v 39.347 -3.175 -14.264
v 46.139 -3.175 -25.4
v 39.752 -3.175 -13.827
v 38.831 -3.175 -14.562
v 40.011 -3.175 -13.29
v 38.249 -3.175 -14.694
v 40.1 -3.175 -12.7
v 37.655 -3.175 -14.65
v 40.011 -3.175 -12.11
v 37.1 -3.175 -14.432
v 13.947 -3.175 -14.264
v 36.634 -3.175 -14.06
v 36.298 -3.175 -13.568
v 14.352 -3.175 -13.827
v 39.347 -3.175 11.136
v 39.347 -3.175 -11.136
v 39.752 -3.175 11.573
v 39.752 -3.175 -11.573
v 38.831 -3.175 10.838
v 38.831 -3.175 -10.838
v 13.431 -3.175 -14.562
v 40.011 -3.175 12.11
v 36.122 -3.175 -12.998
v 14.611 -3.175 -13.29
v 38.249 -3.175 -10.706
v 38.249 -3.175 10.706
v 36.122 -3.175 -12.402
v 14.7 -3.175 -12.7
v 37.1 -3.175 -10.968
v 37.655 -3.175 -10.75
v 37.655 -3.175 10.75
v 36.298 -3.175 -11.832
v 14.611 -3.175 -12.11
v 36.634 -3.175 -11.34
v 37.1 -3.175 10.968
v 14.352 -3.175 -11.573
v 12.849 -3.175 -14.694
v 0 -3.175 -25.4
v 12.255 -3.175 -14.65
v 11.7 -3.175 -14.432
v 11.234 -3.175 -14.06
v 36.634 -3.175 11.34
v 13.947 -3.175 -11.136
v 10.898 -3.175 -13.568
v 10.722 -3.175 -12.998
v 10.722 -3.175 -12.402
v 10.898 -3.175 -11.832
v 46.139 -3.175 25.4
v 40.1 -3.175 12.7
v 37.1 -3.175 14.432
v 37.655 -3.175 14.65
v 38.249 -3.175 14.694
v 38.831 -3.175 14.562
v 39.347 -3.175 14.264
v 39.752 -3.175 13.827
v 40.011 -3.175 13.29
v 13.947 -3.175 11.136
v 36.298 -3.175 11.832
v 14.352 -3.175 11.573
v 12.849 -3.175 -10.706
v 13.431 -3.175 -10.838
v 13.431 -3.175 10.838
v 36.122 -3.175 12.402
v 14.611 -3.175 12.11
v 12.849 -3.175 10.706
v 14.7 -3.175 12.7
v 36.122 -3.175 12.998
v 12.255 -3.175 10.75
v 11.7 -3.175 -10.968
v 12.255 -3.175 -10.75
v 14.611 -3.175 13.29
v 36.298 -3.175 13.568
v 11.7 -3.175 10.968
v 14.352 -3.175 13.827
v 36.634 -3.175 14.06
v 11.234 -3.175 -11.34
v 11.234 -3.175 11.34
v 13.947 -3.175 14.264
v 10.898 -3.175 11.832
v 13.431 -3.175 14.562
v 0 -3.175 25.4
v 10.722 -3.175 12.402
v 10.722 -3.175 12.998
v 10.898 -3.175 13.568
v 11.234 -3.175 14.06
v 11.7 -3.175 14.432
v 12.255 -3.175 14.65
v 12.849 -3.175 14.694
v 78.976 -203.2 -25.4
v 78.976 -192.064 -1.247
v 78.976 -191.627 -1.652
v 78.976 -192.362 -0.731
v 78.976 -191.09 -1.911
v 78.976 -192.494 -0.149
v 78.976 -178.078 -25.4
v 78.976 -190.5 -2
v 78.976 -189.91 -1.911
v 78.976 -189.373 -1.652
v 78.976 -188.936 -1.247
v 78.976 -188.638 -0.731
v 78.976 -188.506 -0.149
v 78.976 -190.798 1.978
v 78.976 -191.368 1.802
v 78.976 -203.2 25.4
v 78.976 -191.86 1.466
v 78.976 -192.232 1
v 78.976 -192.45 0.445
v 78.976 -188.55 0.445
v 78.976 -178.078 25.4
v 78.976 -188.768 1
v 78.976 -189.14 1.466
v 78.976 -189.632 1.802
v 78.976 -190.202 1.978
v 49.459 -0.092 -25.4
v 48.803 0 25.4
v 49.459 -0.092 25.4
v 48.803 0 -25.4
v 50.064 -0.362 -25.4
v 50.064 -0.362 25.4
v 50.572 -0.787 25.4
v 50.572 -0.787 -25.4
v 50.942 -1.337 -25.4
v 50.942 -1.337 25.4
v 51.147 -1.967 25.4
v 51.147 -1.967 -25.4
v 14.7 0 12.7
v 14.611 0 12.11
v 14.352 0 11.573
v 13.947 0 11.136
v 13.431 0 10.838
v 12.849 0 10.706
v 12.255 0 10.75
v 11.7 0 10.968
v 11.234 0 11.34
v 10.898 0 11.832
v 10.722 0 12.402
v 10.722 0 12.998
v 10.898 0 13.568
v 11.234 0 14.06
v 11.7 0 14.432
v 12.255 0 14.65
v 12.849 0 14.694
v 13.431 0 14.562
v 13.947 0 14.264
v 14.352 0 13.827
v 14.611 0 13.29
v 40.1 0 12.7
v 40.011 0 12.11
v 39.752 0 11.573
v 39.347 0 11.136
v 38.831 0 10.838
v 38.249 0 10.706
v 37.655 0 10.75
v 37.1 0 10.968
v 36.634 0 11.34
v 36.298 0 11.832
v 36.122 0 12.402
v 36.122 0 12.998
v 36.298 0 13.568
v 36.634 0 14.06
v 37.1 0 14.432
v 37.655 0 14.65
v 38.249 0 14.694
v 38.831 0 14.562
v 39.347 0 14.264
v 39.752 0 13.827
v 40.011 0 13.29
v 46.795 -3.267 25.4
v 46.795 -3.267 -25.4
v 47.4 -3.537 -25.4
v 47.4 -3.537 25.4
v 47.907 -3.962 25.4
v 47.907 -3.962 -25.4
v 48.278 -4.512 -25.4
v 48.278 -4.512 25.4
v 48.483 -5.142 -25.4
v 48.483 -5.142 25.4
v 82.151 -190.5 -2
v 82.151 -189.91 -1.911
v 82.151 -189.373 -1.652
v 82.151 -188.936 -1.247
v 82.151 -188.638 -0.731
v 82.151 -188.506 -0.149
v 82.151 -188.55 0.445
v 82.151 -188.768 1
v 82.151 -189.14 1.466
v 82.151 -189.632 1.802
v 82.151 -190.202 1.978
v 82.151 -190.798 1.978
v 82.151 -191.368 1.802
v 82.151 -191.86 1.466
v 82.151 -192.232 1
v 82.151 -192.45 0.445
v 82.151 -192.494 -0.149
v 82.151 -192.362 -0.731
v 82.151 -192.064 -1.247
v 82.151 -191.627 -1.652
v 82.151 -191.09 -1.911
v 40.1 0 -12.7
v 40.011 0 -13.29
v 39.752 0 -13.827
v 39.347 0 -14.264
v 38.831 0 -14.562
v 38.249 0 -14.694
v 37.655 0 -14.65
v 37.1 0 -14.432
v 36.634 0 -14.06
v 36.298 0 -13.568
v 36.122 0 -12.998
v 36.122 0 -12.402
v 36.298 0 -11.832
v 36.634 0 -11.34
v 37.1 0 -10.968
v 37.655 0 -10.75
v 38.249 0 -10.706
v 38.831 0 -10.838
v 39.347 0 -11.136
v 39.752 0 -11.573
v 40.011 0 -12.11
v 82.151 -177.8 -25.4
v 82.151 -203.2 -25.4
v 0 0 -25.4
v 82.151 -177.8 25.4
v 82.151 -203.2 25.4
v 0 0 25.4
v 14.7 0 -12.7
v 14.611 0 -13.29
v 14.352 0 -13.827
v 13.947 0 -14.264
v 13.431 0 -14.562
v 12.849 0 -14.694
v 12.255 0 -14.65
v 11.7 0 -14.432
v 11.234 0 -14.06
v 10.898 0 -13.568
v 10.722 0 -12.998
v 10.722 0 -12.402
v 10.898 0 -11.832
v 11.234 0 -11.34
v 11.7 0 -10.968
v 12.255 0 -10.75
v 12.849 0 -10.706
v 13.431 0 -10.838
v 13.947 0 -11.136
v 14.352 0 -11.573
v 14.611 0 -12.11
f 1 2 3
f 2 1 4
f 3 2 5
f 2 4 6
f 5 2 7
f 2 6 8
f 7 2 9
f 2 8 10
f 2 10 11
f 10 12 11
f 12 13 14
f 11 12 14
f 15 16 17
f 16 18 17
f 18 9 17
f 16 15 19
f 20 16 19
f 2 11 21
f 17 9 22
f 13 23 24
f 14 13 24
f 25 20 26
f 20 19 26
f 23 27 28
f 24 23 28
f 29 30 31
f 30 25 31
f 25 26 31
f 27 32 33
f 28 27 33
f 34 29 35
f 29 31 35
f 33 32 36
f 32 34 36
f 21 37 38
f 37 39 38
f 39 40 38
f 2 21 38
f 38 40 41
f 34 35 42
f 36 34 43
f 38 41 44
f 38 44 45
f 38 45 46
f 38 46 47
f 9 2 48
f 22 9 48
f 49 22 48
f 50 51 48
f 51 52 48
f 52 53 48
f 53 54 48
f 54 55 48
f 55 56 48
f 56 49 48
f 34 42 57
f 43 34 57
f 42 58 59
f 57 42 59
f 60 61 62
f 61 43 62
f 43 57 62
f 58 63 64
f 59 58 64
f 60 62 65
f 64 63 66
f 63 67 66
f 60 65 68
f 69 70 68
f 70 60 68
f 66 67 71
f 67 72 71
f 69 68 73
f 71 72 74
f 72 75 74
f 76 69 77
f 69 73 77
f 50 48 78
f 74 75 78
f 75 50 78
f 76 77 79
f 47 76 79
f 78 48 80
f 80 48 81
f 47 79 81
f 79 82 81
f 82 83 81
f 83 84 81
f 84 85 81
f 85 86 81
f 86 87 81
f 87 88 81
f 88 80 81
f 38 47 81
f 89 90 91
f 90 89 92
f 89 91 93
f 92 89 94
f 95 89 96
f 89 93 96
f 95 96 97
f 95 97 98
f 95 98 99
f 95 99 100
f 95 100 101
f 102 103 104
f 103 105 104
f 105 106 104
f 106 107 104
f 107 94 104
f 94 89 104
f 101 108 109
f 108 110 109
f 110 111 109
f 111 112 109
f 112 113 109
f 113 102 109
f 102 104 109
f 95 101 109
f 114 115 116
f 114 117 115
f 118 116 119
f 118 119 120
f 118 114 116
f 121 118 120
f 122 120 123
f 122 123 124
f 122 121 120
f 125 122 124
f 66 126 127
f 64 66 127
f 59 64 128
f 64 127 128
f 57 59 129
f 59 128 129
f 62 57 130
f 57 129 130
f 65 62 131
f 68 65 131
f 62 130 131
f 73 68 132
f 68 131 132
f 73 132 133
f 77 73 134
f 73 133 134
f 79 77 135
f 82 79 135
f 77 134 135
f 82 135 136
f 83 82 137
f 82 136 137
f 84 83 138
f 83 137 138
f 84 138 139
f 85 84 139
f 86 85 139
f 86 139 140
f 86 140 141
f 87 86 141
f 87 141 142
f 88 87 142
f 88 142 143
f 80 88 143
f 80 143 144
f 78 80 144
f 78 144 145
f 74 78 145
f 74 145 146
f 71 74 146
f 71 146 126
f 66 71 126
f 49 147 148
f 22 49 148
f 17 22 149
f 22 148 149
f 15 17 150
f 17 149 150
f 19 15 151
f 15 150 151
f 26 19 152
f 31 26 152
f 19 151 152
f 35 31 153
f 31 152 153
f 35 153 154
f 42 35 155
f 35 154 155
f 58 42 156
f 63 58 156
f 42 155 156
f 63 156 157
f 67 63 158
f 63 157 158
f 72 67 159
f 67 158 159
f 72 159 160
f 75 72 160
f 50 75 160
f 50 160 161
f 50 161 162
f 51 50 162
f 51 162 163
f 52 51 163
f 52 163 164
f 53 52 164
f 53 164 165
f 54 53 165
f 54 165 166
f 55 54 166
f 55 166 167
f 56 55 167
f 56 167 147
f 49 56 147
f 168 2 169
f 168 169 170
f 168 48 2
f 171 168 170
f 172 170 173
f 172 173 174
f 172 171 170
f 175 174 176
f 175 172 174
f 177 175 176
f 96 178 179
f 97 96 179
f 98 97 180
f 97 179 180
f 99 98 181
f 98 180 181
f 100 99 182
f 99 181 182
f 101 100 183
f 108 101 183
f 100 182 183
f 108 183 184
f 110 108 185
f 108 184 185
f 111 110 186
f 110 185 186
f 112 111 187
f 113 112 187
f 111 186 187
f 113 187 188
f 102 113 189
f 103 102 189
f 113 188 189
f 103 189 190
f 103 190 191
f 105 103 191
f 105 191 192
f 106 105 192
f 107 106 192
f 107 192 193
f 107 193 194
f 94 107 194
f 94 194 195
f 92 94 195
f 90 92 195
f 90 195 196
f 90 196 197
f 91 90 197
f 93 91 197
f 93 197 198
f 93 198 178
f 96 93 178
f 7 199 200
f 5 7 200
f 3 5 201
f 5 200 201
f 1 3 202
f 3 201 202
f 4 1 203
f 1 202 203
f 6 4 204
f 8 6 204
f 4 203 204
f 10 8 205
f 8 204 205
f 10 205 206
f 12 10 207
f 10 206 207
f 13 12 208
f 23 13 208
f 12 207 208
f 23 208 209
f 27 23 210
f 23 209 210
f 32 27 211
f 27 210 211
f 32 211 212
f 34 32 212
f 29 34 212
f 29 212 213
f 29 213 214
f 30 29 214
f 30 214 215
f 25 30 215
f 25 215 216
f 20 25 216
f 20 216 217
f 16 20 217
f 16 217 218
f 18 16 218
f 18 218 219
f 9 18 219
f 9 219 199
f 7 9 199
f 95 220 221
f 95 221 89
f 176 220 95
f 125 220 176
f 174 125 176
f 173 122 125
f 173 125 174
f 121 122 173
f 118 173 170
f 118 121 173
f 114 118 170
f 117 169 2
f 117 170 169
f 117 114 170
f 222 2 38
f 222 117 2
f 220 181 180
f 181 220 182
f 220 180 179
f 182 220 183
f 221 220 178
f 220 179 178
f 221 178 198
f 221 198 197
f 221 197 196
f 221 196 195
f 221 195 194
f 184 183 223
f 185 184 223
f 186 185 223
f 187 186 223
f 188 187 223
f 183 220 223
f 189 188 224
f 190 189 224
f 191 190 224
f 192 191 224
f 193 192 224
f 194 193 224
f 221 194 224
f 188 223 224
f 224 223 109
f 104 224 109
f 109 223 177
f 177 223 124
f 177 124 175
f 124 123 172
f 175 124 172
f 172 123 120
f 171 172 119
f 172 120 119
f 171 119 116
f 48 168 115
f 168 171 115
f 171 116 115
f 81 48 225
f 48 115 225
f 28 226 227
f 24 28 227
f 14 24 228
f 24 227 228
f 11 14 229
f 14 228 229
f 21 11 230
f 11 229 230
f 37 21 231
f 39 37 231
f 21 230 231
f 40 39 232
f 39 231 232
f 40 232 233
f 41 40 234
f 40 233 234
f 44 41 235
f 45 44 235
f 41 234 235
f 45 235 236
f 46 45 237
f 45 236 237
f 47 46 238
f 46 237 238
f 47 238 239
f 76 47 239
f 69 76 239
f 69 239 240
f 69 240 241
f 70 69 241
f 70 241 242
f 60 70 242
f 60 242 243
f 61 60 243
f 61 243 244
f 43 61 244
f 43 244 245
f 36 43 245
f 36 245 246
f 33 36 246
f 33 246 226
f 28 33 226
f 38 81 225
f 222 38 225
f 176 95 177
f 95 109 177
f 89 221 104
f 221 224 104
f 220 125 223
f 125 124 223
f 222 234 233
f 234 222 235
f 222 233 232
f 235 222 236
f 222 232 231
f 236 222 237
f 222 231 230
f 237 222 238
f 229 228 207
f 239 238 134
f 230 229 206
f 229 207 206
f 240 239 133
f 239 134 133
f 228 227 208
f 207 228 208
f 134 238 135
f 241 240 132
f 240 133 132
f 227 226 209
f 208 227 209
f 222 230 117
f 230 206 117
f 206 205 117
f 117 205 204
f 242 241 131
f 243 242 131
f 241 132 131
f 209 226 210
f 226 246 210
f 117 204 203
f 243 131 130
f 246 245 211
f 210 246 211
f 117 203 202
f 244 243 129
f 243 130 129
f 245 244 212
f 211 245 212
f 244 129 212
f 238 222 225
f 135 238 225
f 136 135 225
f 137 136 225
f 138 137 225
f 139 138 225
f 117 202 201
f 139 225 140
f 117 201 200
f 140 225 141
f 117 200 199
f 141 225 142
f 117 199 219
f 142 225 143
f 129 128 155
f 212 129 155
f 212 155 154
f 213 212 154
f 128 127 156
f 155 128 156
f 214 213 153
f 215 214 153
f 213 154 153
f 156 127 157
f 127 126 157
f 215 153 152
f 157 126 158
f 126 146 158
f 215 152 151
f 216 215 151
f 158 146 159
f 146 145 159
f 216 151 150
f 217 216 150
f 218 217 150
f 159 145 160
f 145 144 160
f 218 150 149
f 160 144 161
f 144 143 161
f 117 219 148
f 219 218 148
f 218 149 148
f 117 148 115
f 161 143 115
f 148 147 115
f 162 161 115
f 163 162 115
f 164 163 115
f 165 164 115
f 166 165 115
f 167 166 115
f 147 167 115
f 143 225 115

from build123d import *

# Parameters (mm, degrees)
BOSS_EXTRUDE1_DEPTH = 25.4
SKETCH3_R           = 2
CUT_EXTRUDE1_DEPTH  = 50.8
SKETCH4_R           = 2
CUT_EXTRUDE2_DEPTH  = 83.15093717
FILLET1_R           = 2.38


with BuildPart() as part:
    # Sketch1 → Boss-Extrude1 (new body, symmetric)
    with BuildSketch(Plane.XY):
        Polygon((0, 0), (50.8, 0), (82.15093717, -177.8), (82.15093717, -203.2), (78.97593717, -203.2), (78.97593717, -178.077776507), (48.135858671, -3.175), (0, -3.175), align=None)
    extrude(amount=BOSS_EXTRUDE1_DEPTH, both=True)

    # Sketch3 → Cut-Extrude1 (cut)
    with BuildSketch(Plane(origin=(0, 0, 0), x_dir=(1, 0, 0), z_dir=(0, 1, 0))):
        with Locations((12.7, -12.7)):
            Circle(SKETCH3_R)
        with Locations((12.7, 12.7)):
            Circle(SKETCH3_R)
        with Locations((38.1, 12.7)):
            Circle(SKETCH3_R)
        with Locations((38.1, -12.7)):
            Circle(SKETCH3_R)
    extrude(amount=-CUT_EXTRUDE1_DEPTH, mode=Mode.SUBTRACT)

    # Sketch4 → Cut-Extrude2 (cut, through all)
    with BuildSketch(Plane(origin=(82.15093717, 0, 0), x_dir=(0, 0, -1), z_dir=(1, 0, 0))):
        with Locations((0, -190.5)):
            Circle(SKETCH4_R)
    extrude(amount=-CUT_EXTRUDE2_DEPTH, mode=Mode.SUBTRACT)

    # Fillet1
    fillet1_edges = [part.edges().sort_by_distance(p)[0] for p in [
        (50.8, 0, 0),
        (48.135858671, -3.175, 0),
    ]]
    fillet(fillet1_edges, radius=FILLET1_R)


solid = part.part
